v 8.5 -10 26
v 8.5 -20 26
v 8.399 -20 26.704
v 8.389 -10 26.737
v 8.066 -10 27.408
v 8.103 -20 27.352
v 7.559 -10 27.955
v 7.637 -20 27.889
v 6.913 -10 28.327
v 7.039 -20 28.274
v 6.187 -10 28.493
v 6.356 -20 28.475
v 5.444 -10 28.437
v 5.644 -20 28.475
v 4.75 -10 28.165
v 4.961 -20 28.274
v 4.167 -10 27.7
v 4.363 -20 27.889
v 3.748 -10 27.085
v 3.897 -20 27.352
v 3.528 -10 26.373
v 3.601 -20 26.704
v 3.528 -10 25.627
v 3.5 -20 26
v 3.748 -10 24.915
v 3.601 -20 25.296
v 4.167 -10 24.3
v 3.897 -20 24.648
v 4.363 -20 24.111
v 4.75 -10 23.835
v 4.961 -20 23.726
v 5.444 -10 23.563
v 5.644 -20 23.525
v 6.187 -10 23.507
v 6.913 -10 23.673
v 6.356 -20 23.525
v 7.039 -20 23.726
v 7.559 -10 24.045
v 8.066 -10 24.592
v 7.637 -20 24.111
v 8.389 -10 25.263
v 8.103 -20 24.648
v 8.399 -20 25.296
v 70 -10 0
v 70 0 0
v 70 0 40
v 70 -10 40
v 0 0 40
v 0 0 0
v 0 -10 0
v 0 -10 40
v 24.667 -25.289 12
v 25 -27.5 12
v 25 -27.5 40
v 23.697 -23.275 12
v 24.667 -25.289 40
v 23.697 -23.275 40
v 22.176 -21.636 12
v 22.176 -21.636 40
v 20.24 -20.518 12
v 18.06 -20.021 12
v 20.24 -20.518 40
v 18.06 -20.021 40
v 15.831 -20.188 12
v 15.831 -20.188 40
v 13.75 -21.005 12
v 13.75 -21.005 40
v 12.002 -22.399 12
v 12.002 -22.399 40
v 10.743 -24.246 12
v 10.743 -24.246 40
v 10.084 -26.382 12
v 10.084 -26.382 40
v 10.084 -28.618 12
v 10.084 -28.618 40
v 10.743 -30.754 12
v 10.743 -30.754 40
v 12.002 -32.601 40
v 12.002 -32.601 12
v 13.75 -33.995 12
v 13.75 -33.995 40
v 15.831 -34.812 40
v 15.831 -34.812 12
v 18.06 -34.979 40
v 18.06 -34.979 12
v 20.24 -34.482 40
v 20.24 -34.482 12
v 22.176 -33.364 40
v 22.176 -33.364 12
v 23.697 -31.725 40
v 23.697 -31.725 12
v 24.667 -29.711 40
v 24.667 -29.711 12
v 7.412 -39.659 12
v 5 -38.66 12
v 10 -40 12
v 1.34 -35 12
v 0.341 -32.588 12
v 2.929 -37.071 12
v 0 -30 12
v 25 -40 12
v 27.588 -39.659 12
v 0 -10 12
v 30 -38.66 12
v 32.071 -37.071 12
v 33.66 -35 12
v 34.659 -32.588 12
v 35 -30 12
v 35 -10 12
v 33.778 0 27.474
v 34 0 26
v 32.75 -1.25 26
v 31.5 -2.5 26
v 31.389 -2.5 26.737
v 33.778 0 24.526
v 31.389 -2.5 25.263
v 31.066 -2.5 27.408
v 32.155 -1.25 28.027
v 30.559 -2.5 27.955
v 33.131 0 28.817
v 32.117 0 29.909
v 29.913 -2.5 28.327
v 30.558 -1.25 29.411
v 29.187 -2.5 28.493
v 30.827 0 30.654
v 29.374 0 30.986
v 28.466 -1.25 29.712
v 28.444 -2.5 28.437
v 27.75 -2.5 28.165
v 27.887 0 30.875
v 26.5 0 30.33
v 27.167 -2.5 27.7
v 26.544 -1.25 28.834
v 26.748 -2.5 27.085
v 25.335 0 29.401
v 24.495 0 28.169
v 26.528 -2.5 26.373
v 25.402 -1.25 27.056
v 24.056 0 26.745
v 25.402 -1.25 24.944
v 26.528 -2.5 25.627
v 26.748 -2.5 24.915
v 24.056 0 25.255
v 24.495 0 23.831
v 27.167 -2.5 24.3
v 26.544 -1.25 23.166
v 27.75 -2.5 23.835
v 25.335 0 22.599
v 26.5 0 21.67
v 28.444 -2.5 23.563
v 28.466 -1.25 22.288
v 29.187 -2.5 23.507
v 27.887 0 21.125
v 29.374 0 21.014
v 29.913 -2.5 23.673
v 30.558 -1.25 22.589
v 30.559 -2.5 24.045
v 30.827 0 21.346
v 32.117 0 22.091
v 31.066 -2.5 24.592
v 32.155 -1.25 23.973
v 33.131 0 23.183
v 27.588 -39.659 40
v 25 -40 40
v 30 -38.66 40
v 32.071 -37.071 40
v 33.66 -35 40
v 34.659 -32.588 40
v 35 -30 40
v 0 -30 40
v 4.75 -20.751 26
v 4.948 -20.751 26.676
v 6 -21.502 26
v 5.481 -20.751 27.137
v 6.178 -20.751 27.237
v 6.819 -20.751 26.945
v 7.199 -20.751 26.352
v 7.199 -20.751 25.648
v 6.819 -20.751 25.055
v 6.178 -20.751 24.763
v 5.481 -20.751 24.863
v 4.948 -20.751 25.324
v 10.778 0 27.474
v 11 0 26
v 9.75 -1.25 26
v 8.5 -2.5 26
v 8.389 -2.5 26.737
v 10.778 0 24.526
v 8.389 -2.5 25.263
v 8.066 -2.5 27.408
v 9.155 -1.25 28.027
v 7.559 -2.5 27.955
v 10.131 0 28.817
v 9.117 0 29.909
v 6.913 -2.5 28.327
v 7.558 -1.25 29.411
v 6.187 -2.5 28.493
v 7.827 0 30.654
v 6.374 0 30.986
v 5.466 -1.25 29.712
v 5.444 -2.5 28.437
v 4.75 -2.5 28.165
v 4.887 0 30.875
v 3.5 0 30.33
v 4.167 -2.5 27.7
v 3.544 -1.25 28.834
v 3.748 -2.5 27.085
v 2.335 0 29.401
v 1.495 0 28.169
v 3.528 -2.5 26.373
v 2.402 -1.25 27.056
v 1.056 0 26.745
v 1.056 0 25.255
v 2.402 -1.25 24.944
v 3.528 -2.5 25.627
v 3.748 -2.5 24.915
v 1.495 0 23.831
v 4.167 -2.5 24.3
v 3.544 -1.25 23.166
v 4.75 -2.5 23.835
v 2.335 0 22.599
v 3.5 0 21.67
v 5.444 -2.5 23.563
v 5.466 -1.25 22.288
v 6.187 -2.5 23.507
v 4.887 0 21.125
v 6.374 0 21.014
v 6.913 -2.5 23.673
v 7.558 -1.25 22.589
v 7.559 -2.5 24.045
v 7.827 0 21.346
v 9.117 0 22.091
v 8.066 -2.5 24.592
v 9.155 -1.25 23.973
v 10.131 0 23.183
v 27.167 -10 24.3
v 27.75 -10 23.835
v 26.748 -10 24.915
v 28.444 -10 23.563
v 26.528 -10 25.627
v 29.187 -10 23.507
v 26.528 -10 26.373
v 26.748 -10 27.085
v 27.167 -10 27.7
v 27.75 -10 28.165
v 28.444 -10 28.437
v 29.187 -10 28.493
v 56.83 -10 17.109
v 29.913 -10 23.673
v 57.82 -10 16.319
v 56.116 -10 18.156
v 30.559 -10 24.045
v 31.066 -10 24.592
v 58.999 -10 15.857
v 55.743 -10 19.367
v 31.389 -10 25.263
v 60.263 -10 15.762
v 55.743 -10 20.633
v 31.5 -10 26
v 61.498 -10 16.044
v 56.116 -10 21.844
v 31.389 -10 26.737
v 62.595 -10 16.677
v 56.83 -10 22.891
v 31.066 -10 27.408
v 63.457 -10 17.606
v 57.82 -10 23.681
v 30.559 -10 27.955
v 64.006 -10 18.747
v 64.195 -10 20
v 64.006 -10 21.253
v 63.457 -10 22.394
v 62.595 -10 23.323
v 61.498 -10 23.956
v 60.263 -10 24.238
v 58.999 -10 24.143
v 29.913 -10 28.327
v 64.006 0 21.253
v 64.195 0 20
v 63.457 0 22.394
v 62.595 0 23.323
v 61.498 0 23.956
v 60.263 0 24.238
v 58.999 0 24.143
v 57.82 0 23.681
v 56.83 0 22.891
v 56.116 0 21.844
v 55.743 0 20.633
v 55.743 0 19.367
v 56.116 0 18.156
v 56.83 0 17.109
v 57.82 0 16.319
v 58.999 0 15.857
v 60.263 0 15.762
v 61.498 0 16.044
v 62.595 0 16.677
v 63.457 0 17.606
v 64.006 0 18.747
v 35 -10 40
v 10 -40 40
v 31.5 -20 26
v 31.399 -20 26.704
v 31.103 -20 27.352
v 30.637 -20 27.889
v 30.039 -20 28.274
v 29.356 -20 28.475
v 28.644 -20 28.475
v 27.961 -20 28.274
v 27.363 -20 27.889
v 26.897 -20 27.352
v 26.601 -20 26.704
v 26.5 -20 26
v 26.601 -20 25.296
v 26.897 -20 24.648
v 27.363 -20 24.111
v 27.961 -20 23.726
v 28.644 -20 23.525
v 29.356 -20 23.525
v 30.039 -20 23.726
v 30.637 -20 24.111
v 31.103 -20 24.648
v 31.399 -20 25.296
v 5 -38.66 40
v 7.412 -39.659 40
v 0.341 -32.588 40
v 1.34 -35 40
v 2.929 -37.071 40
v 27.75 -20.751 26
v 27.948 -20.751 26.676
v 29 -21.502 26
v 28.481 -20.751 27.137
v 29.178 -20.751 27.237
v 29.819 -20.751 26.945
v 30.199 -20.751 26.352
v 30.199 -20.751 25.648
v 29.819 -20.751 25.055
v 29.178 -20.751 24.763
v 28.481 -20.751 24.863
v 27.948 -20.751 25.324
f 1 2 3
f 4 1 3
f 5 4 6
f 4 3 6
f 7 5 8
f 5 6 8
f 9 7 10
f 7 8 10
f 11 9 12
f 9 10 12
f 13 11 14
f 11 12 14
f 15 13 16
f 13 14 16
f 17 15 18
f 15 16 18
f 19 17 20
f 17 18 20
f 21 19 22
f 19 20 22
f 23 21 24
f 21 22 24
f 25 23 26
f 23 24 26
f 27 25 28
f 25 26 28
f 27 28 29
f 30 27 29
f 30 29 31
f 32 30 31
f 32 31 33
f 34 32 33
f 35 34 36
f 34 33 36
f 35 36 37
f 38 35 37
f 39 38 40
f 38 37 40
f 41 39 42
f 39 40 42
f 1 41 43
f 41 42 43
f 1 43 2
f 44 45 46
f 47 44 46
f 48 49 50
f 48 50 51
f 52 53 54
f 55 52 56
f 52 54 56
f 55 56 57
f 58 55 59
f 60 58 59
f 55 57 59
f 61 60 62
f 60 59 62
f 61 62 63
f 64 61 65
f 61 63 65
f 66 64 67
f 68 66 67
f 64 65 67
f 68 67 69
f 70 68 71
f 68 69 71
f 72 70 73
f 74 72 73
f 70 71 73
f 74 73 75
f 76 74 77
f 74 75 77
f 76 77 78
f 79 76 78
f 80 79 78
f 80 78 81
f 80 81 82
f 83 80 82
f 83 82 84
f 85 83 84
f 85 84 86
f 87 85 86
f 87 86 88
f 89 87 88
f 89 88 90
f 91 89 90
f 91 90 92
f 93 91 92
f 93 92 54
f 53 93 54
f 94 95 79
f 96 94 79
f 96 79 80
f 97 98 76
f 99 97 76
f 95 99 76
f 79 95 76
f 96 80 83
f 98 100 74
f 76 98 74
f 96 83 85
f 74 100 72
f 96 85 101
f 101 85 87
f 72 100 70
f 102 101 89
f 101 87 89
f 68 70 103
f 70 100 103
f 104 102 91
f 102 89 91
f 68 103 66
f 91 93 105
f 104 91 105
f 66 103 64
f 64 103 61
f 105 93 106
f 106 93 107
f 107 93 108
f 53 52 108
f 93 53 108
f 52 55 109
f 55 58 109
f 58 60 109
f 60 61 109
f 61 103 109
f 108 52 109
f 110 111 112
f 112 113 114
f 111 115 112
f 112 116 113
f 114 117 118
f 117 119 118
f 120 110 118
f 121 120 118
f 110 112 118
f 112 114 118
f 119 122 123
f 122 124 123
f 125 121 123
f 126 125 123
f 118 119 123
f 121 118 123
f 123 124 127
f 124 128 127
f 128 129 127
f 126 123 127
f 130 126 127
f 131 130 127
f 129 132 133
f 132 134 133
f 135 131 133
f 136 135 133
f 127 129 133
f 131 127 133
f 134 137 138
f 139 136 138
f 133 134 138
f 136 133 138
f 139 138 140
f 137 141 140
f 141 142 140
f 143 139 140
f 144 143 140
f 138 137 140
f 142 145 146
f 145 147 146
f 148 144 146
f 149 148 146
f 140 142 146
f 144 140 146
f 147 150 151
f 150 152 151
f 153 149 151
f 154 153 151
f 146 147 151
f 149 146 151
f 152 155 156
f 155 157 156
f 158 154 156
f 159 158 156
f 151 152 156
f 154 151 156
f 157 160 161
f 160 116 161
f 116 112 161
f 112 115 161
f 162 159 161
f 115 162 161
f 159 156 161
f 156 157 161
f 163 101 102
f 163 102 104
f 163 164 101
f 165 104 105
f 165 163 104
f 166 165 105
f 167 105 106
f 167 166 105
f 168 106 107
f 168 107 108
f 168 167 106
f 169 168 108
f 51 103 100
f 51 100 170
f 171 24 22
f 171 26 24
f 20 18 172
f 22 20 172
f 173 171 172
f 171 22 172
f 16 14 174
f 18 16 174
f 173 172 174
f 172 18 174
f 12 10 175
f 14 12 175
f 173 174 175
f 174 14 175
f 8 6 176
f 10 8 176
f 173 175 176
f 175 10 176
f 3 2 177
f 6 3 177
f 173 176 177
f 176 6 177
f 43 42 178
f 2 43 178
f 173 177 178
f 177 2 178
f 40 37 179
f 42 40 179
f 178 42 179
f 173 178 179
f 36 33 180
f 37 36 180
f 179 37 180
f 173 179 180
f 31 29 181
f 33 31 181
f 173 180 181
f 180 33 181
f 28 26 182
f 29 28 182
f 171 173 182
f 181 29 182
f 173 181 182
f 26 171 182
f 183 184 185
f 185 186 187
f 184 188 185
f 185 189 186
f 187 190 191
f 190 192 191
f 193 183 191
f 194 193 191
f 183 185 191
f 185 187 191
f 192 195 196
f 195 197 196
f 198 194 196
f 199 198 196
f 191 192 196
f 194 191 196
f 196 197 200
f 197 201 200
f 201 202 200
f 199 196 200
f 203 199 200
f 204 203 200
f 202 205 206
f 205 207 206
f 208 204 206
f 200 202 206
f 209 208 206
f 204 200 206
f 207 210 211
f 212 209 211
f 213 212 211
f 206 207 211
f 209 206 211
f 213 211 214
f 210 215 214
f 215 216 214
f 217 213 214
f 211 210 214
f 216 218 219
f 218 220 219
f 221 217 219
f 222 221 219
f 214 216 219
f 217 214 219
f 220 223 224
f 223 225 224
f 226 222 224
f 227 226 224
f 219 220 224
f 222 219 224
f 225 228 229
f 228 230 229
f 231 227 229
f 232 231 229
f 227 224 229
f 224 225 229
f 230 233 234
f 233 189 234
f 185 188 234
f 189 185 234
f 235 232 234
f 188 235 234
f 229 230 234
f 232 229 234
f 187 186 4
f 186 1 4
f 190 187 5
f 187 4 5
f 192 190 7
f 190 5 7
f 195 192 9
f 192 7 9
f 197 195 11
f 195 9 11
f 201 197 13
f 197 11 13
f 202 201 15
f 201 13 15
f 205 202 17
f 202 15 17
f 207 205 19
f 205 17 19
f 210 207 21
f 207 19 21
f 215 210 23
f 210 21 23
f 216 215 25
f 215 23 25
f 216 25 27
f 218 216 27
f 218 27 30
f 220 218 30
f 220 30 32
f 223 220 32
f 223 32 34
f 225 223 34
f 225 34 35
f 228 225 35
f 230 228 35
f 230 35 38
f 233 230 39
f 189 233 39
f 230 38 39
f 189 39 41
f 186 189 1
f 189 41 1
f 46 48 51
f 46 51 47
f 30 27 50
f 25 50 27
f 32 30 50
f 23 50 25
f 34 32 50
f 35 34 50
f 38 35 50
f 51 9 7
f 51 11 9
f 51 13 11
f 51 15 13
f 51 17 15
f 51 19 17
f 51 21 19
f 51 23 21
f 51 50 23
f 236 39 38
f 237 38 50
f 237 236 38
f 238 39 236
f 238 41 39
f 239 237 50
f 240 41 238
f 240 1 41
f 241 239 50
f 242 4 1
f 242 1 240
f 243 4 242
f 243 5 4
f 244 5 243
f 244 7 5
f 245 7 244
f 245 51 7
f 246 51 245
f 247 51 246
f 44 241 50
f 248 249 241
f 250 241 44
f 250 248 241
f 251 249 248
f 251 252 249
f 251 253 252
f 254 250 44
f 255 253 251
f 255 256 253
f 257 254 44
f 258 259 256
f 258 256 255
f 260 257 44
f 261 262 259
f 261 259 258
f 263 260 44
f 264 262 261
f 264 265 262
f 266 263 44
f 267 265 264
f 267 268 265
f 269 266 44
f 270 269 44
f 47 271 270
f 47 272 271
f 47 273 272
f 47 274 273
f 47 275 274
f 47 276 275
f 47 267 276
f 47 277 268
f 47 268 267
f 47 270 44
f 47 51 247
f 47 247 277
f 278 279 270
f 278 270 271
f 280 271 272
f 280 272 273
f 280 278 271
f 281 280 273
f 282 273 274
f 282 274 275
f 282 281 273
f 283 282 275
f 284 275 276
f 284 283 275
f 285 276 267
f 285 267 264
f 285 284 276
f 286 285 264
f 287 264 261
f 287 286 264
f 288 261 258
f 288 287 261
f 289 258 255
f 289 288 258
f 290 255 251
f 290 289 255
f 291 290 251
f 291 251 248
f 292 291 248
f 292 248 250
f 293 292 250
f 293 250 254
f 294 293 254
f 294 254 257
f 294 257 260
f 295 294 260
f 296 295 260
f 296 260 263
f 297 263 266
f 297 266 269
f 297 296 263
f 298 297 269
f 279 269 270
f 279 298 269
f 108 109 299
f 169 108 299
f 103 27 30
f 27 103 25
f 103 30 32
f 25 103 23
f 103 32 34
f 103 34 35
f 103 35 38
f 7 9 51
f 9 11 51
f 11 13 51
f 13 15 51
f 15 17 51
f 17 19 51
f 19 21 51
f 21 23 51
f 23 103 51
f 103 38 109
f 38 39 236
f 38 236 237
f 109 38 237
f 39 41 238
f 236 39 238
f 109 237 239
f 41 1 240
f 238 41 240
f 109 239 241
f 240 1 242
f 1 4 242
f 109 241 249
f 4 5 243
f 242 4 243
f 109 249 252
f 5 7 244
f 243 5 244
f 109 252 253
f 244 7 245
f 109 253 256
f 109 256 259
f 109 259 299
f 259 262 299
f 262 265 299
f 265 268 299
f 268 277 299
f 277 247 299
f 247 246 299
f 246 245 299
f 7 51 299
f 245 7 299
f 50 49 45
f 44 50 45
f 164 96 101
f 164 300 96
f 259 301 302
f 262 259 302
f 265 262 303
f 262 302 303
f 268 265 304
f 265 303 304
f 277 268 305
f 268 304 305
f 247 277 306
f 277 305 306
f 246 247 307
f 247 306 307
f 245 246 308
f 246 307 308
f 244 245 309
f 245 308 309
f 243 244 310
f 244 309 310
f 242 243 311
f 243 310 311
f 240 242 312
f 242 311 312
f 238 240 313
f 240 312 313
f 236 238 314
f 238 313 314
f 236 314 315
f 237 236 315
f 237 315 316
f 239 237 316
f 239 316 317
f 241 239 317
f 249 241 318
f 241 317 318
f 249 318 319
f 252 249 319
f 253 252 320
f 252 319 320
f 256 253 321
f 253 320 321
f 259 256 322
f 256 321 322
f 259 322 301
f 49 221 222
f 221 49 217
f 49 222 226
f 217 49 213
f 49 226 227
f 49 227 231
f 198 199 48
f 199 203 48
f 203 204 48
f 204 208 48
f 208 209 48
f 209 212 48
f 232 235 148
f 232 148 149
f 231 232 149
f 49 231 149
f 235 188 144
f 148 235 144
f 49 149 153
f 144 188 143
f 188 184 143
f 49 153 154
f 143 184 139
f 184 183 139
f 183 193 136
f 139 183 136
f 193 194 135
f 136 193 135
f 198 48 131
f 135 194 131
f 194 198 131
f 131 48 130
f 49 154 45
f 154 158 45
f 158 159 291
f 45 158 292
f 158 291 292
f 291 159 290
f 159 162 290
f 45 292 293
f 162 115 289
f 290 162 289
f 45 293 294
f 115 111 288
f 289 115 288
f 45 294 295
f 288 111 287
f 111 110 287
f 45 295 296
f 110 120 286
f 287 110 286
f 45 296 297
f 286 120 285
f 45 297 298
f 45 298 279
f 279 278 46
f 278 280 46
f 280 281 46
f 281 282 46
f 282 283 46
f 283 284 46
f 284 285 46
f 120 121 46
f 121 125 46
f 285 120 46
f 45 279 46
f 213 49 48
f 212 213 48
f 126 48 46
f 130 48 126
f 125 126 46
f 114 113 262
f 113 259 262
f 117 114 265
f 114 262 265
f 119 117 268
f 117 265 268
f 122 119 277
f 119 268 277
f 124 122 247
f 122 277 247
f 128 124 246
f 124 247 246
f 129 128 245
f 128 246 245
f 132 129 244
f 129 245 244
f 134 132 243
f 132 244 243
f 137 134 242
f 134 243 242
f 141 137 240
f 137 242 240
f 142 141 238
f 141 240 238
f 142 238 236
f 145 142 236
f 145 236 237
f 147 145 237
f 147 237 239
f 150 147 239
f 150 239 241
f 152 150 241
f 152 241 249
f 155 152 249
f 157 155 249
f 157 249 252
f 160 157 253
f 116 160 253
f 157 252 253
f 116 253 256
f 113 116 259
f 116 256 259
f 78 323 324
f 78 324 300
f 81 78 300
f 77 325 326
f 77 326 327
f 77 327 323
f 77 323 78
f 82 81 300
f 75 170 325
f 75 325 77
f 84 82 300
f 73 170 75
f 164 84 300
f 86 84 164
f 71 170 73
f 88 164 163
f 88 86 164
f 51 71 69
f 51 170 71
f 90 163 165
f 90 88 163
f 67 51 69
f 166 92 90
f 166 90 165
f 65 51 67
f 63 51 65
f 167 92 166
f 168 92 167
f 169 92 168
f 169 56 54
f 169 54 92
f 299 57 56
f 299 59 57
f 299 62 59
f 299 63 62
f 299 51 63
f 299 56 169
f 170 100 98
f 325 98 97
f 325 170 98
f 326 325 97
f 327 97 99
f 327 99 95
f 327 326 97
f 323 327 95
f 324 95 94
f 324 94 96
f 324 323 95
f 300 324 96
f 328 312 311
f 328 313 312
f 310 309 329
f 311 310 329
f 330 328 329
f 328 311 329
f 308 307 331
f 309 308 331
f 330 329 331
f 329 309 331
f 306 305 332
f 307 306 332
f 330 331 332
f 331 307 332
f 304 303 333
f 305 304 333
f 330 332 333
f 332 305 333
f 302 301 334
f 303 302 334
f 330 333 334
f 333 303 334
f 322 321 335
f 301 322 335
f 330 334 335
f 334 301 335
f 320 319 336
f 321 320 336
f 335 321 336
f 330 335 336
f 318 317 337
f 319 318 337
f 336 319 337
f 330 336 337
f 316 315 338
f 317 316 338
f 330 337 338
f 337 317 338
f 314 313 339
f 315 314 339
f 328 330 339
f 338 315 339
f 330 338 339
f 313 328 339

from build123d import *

# Parameters (mm, degrees)
F0_W             = 70
F0_H             = 40
F0_R             = 4.25
F1_DEPTH         = 10
F2_W             = 35
F2_H             = 28
F2_R             = 2.5
F3_DEPTH         = 30
F4_R             = 7.5
F5_DEPTH         = 40.001
F7_D             = 5
F7_DEPTH         = 20
F7_CSINK_D       = 10
F7_CSINK_ANGLE   = 90
F7_TIP           = 1.5021515476
F7_2_D           = 5
F7_2_DEPTH       = 20
F7_2_CSINK_D     = 10
F7_2_CSINK_ANGLE = 90
F7_2_TIP         = 1.5021515476
F8_R             = 10


with BuildPart() as f1:
    # F0 (on Front) → F1 (new body)
    with BuildSketch(Plane.XZ):
        with Locations((35, 20)):
            Rectangle(F0_W, F0_H)
        with Locations((59.9450543523, 20)):
            Circle(F0_R, mode=Mode.SUBTRACT)
    extrude(amount=F1_DEPTH)

    # F7
    with Locations(Plane(origin=(0, 0, 0), x_dir=(-1, 0, 0), z_dir=(0, 1, 0))):
        with Locations((-29, 26), (-6, 26)):
            CounterSinkHole(F7_D / 2, F7_CSINK_D / 2, depth=F7_DEPTH, counter_sink_angle=F7_CSINK_ANGLE)
            with Locations((0, 0, -(F7_DEPTH + F7_TIP / 2))):  # 118° drill point
                Cone(0, F7_D / 2, F7_TIP, mode=Mode.SUBTRACT)


with BuildPart() as f3:
    # F2 (on face) → F3 (new body)
    with BuildSketch(Plane.XZ.offset(10)):
        with Locations((17.5, 26)):
            Rectangle(F2_W, F2_H)
        with Locations((5, 26)):
            Circle(F2_R, mode=Mode.SUBTRACT)
        with Locations((30, 26)):
            Circle(F2_R, mode=Mode.SUBTRACT)
        with Locations((5, 26)):
            Circle(F2_R)
        with Locations((30, 26)):
            Circle(F2_R)
    extrude(amount=F3_DEPTH)

    # F4 (on face) → F5 (cut, through all)
    with BuildSketch(Plane.XY.offset(40)):
        with Locations((17.5, -27.5)):
            Circle(F4_R)
    extrude(amount=-F5_DEPTH, mode=Mode.SUBTRACT)

    # F7#2
    with Locations(Plane(origin=(0, 0, 0), x_dir=(-1, 0, 0), z_dir=(0, 1, 0))):
        with Locations((-29, 26), (-6, 26)):
            CounterSinkHole(F7_2_D / 2, F7_2_CSINK_D / 2, depth=F7_2_DEPTH, counter_sink_angle=F7_2_CSINK_ANGLE)
            with Locations((0, 0, -(F7_2_DEPTH + F7_2_TIP / 2))):  # 118° drill point
                Cone(0, F7_2_D / 2, F7_2_TIP, mode=Mode.SUBTRACT)

    # F8
    f8_edges = [f3.edges().sort_by_distance(p)[0] for p in [
        (35, -40, 26),
        (0, -40, 26),
    ]]
    fillet(f8_edges, radius=F8_R)


solid = Compound([f1.part, f3.part])
